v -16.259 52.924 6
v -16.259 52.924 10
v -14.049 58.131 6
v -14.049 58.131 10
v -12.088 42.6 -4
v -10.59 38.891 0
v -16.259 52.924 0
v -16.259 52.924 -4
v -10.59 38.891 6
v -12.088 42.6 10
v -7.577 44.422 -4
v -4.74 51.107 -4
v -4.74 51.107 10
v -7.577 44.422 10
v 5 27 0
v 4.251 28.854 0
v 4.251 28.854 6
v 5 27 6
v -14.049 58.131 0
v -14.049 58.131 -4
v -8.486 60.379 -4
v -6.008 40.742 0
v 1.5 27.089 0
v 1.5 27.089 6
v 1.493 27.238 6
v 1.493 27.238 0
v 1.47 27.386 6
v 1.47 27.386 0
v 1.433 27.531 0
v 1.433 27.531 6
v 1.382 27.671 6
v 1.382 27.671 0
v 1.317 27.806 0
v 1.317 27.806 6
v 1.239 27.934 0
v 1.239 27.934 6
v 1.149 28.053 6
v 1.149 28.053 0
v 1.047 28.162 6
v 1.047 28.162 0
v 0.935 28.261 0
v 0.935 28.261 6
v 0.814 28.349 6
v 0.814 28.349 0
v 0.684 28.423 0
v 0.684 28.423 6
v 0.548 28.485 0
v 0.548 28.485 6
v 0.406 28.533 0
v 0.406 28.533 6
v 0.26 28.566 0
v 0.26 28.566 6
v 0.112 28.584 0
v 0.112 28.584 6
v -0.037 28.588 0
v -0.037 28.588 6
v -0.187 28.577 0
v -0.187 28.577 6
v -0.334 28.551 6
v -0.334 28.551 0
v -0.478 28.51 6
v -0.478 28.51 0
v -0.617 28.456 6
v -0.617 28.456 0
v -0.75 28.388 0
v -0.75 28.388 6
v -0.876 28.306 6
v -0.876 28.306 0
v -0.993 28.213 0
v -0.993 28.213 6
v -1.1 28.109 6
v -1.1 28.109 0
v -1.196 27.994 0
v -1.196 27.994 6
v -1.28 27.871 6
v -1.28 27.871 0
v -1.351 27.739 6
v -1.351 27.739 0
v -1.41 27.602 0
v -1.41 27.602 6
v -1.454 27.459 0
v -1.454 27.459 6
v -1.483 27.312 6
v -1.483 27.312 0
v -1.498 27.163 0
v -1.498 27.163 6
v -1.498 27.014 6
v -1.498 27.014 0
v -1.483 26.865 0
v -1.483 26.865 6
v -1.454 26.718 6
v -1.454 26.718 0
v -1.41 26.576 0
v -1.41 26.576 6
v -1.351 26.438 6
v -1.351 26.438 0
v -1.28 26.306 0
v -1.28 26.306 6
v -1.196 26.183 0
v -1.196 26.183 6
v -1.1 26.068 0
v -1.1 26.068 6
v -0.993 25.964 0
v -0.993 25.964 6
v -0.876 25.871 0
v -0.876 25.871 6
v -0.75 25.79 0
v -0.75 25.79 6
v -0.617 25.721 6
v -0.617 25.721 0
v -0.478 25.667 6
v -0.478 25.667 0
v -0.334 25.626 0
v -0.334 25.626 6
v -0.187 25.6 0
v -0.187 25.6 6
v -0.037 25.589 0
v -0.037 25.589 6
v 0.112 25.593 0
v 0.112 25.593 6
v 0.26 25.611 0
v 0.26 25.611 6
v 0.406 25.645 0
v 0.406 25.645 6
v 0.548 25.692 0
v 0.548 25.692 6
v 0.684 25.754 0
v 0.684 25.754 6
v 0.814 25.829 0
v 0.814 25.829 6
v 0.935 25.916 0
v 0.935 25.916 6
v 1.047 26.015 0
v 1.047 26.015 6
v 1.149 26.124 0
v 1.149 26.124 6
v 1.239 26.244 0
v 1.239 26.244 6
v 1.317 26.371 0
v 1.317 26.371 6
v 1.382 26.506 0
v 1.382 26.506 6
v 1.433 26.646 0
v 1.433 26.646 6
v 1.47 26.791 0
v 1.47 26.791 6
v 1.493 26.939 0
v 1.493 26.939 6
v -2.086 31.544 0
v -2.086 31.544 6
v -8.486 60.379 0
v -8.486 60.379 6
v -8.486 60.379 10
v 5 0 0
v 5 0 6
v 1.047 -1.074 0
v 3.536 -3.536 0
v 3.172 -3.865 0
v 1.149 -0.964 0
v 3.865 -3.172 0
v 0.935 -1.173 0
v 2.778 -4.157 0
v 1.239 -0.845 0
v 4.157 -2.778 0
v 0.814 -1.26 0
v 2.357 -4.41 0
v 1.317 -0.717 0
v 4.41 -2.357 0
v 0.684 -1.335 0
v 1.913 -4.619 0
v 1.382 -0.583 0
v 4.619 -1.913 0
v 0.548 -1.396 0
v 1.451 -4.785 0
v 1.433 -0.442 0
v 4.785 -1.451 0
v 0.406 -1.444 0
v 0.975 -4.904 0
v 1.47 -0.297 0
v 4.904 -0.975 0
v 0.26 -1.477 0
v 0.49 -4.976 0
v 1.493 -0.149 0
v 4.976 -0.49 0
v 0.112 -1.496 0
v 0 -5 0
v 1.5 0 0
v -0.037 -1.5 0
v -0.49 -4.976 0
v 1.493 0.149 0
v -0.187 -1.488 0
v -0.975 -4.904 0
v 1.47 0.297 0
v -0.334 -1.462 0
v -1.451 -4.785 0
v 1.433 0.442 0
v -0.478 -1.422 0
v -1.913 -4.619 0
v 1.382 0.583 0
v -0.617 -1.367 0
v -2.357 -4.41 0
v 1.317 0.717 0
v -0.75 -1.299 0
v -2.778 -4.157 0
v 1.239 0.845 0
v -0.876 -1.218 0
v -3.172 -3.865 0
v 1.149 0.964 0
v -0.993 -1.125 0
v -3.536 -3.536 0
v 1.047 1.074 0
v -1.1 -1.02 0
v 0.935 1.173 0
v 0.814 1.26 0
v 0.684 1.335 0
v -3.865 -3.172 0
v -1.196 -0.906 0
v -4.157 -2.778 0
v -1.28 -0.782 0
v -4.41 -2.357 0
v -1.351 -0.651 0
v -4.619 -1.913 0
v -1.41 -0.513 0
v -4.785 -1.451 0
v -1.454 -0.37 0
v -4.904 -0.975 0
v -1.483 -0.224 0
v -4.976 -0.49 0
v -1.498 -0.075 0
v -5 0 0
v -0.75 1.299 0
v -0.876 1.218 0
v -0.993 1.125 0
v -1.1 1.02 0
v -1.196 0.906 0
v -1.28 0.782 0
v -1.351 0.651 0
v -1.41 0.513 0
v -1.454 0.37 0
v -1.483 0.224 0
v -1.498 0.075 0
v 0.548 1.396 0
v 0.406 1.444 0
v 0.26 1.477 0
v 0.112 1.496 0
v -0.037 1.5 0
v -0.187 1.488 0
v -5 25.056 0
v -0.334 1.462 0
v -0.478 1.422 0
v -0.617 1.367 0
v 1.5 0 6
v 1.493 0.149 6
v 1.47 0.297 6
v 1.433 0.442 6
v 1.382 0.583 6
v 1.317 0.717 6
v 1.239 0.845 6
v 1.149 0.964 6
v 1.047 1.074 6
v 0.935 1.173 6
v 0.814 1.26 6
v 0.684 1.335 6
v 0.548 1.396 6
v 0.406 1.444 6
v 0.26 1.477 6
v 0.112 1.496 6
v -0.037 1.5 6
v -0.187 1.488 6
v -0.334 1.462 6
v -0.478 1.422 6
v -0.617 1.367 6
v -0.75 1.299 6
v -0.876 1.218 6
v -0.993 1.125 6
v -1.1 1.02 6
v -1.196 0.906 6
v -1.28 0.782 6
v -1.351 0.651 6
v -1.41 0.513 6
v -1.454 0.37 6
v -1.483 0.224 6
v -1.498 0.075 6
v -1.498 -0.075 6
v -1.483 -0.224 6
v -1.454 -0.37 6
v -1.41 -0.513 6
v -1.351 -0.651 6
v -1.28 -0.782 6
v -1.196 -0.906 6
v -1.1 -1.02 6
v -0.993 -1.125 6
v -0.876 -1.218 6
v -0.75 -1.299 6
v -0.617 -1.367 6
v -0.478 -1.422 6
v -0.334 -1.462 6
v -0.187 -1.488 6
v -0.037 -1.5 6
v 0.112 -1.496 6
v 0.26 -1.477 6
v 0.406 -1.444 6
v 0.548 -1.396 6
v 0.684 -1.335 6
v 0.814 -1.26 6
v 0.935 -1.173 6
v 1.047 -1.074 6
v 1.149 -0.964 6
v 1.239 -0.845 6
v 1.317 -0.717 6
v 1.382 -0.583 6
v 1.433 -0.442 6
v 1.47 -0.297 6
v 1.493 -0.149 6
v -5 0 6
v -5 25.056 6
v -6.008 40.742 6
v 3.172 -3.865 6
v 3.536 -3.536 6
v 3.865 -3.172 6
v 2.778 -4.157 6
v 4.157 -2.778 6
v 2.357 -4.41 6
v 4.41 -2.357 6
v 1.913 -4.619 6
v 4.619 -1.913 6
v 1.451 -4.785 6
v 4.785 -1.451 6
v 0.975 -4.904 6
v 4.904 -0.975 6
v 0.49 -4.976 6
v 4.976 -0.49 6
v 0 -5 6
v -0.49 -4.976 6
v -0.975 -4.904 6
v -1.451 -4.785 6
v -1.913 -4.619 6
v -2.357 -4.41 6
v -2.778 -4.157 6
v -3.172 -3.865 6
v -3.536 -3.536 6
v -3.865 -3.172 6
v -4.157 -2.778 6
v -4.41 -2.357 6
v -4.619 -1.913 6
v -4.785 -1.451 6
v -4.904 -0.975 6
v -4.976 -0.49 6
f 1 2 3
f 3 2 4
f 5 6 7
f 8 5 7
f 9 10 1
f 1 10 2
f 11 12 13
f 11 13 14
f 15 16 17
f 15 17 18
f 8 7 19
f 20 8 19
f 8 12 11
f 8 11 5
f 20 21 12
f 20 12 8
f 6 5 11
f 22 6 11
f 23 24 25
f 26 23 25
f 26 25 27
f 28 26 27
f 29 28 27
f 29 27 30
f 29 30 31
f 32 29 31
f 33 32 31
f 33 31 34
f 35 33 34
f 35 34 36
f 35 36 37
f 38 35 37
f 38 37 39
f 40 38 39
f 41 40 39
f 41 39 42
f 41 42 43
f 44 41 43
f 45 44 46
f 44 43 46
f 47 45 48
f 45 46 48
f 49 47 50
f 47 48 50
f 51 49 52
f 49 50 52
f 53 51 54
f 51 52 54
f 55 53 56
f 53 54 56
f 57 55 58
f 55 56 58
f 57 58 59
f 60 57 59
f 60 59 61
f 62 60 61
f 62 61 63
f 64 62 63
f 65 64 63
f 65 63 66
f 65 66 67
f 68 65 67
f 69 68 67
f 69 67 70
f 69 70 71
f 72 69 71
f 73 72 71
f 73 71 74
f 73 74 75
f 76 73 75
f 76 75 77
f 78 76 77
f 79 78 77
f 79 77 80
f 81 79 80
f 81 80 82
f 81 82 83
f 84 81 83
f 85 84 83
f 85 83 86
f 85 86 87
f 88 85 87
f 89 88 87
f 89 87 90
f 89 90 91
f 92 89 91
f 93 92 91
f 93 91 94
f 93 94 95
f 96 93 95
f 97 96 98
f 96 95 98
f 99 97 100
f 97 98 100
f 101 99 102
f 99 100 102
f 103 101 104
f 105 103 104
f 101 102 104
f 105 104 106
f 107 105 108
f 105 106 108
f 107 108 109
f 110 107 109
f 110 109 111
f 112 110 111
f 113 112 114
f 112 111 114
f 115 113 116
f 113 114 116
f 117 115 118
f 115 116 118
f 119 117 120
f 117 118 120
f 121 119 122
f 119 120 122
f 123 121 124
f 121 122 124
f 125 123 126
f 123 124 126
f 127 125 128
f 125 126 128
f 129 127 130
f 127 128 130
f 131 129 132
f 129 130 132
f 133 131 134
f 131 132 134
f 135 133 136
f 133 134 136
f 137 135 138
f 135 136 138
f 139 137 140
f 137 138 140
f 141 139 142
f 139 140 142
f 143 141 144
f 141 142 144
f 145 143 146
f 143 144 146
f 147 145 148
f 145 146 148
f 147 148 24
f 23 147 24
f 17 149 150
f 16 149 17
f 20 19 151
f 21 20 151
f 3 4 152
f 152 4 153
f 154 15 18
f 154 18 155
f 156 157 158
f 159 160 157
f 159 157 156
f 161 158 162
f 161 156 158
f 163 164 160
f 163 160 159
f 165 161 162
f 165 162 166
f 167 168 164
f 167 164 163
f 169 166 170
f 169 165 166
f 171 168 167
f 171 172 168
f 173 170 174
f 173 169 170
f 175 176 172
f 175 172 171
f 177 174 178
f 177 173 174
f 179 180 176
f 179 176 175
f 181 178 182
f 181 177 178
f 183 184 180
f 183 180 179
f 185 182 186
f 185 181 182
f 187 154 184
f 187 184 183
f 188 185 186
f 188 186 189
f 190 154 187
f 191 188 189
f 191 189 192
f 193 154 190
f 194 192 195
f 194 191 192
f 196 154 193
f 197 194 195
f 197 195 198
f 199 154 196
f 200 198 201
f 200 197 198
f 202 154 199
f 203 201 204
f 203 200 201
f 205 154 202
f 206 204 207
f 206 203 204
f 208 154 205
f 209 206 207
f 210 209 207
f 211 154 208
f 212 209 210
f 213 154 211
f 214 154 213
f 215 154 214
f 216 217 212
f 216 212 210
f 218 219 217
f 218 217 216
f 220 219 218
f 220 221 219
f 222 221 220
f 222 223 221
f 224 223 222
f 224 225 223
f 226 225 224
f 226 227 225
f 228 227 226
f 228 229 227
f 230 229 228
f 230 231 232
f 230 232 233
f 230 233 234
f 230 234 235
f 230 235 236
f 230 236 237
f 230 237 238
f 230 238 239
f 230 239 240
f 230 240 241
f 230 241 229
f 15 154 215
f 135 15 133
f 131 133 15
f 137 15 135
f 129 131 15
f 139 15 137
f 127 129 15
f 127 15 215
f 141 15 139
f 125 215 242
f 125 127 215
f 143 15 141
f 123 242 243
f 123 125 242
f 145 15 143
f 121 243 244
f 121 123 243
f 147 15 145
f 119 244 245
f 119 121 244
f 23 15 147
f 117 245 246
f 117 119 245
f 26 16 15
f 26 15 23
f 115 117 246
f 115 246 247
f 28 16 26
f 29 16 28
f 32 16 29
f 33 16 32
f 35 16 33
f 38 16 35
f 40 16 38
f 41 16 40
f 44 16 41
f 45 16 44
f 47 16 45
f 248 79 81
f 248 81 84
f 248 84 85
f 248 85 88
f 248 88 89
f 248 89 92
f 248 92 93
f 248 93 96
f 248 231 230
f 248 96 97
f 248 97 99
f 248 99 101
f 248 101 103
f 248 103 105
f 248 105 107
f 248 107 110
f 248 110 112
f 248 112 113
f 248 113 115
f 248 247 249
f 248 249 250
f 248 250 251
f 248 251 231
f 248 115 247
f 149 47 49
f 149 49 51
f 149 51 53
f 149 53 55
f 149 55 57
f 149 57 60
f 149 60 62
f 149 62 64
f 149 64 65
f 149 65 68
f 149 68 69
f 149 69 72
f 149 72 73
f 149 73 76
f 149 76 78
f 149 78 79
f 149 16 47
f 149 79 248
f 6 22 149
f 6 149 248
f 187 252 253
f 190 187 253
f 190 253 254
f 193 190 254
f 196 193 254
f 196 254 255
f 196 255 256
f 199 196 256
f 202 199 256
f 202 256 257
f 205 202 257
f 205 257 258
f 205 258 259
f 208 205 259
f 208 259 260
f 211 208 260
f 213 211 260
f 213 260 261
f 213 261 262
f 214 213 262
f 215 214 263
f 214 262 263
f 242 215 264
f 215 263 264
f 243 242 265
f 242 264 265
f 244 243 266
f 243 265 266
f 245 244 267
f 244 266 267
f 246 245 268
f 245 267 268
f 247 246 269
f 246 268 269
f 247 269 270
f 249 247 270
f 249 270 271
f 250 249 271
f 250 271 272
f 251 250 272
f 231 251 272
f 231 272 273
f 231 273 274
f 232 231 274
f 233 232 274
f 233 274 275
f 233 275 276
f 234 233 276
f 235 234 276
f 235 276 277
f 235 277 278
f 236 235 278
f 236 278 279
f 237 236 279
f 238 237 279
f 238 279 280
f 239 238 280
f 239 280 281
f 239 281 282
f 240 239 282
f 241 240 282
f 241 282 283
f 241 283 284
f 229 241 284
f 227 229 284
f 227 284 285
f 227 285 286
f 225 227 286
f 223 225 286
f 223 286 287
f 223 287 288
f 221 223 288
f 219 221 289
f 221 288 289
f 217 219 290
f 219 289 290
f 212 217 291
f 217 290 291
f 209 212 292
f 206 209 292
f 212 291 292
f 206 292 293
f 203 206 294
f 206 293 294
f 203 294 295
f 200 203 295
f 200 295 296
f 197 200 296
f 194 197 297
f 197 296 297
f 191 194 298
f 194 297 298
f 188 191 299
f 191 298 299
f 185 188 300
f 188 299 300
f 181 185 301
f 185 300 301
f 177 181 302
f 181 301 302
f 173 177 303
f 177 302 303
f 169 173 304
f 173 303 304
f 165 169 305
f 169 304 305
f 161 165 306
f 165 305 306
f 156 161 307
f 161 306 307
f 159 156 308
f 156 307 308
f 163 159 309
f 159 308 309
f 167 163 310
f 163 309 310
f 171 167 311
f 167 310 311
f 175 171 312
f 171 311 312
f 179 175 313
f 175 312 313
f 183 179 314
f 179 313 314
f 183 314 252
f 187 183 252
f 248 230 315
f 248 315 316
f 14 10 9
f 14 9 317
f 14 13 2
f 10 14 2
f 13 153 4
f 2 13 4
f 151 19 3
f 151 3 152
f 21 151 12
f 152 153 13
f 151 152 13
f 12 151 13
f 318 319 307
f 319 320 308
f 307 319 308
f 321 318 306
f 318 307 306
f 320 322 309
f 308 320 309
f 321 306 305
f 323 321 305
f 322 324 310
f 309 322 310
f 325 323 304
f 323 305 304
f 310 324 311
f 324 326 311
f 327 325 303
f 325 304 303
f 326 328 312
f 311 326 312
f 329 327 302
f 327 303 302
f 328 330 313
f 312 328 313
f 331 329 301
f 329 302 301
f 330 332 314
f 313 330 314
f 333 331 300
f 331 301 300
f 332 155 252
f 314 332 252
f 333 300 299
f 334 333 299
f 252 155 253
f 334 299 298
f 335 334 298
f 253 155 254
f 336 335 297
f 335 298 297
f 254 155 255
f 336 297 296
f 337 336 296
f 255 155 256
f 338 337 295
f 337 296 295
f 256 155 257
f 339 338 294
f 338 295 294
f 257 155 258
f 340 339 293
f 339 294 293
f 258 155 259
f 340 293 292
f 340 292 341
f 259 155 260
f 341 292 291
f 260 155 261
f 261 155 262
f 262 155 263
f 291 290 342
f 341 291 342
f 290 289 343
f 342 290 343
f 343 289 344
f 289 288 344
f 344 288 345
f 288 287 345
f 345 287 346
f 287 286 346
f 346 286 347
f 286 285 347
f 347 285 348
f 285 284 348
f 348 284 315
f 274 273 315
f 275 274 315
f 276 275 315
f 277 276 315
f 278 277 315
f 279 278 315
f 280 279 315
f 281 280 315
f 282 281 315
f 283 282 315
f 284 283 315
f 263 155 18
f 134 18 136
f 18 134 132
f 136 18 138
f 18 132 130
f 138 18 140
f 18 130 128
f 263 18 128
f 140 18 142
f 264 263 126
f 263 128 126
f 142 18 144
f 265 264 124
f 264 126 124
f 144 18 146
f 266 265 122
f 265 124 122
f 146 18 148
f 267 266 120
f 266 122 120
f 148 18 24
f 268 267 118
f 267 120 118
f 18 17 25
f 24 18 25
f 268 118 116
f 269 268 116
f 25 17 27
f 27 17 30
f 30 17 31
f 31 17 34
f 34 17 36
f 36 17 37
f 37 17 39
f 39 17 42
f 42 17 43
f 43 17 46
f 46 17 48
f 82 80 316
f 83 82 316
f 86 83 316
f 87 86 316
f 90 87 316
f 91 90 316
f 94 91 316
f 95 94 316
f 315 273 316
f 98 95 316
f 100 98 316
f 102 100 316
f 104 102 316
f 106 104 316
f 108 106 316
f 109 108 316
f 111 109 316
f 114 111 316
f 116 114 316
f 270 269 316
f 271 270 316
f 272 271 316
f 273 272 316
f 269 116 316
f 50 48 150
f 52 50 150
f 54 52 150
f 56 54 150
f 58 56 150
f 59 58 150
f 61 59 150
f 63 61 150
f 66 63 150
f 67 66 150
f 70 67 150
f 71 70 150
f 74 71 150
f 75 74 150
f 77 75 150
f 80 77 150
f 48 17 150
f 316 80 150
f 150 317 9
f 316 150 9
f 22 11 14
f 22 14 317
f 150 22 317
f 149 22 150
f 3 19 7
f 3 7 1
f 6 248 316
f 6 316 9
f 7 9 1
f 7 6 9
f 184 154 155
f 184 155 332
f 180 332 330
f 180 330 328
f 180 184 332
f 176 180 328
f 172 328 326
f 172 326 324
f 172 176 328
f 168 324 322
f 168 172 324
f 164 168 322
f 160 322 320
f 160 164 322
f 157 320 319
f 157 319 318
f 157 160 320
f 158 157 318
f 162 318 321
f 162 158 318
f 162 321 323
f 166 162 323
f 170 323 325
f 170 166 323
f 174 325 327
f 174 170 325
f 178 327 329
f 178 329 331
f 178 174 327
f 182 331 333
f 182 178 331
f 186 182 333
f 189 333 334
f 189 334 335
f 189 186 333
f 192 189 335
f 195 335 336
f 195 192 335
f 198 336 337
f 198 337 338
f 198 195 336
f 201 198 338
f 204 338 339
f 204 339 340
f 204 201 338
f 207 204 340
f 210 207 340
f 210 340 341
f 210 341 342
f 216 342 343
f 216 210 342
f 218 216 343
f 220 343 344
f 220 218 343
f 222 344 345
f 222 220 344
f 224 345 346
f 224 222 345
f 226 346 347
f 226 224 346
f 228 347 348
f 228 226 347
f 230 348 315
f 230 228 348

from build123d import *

# Parameters (mm, degrees)
EXTRUDE_1_DEPTH      = 6
CHAMFER_1_SIZE       = 4
SKETCH_2_R           = 1.5
CUT_EXTRUDE_1_DEPTH  = 63.816723883
EXTRUDE_2_DEPTH      = 4
EXTRUDE_2_DEPTH_BACK = 10
CHAMFER_2_SIZE       = 4


with BuildPart() as part:
    # 草图1 → 凸台-拉伸1 (new body)
    with BuildSketch(Plane.XY):
        with BuildLine():
            Line((-5, 0), (-5, 25.056196909))
            Line((-5, 25.056196909), (-17.757675909, 56.63255283))
            Line((-17.757675909, 56.63255283), (-8.485837363, 60.378618764))
            Line((-8.485837363, 60.378618764), (-4.739771429, 51.106780219))
            Line((-4.739771429, 51.106780219), (-7.577195414, 44.422228211))
            Line((-7.577195414, 44.422228211), (-2.08588611, 31.544125784))
            Line((-2.08588611, 31.544125784), (4.250786813, 28.854367709))
            Line((4.250786813, 28.854367709), (5, 27))
            Line((5, 27), (5, 0))
            ThreePointArc((5, 0), (0, -5), (-5, 0))
        make_face()
    extrude(amount=EXTRUDE_1_DEPTH)

    # 倒角1
    chamfer_1_edges = [part.edges().sort_by_distance(p)[0] for p in [
        (-17.757675909, 56.63255283, 3),
    ]]
    chamfer(chamfer_1_edges, length=CHAMFER_1_SIZE)

    # 草图2 → 切除-拉伸1 (cut, through all)
    with BuildSketch(Plane.XY.offset(6)):
        with Locations((0, 27.08857665)):
            Circle(SKETCH_2_R)
        Circle(SKETCH_2_R)
    extrude(amount=-CUT_EXTRUDE_1_DEPTH, mode=Mode.SUBTRACT)

    # 草图3 → 凸台-拉伸2 (add, two sides: drawn at the far end of the back side and taken through both)
    with BuildSketch(Plane(origin=(0, 0, 0), x_dir=(-1, 0, 0), z_dir=(0, 0, -1)).offset(-EXTRUDE_2_DEPTH_BACK)):
        Polygon((16.259249535, 52.923817412), (14.04894049, 58.130979204), (8.485837363, 60.378618764), (4.739771429, 51.106780219), (7.577195414, 44.422228211), (12.088045963, 42.599726288), align=None)
    extrude(amount=EXTRUDE_2_DEPTH + EXTRUDE_2_DEPTH_BACK)

    # 倒角2
    chamfer_2_edges = [part.edges().sort_by_distance(p)[0] for p in [
        (-9.832620688, 43.51097725, 6),
        (-9.832620688, 43.51097725, 0),
    ]]
    chamfer(chamfer_2_edges, length=CHAMFER_2_SIZE - 0.0001)  # a hair under: the kernel refuses the full size


solid = part.part
